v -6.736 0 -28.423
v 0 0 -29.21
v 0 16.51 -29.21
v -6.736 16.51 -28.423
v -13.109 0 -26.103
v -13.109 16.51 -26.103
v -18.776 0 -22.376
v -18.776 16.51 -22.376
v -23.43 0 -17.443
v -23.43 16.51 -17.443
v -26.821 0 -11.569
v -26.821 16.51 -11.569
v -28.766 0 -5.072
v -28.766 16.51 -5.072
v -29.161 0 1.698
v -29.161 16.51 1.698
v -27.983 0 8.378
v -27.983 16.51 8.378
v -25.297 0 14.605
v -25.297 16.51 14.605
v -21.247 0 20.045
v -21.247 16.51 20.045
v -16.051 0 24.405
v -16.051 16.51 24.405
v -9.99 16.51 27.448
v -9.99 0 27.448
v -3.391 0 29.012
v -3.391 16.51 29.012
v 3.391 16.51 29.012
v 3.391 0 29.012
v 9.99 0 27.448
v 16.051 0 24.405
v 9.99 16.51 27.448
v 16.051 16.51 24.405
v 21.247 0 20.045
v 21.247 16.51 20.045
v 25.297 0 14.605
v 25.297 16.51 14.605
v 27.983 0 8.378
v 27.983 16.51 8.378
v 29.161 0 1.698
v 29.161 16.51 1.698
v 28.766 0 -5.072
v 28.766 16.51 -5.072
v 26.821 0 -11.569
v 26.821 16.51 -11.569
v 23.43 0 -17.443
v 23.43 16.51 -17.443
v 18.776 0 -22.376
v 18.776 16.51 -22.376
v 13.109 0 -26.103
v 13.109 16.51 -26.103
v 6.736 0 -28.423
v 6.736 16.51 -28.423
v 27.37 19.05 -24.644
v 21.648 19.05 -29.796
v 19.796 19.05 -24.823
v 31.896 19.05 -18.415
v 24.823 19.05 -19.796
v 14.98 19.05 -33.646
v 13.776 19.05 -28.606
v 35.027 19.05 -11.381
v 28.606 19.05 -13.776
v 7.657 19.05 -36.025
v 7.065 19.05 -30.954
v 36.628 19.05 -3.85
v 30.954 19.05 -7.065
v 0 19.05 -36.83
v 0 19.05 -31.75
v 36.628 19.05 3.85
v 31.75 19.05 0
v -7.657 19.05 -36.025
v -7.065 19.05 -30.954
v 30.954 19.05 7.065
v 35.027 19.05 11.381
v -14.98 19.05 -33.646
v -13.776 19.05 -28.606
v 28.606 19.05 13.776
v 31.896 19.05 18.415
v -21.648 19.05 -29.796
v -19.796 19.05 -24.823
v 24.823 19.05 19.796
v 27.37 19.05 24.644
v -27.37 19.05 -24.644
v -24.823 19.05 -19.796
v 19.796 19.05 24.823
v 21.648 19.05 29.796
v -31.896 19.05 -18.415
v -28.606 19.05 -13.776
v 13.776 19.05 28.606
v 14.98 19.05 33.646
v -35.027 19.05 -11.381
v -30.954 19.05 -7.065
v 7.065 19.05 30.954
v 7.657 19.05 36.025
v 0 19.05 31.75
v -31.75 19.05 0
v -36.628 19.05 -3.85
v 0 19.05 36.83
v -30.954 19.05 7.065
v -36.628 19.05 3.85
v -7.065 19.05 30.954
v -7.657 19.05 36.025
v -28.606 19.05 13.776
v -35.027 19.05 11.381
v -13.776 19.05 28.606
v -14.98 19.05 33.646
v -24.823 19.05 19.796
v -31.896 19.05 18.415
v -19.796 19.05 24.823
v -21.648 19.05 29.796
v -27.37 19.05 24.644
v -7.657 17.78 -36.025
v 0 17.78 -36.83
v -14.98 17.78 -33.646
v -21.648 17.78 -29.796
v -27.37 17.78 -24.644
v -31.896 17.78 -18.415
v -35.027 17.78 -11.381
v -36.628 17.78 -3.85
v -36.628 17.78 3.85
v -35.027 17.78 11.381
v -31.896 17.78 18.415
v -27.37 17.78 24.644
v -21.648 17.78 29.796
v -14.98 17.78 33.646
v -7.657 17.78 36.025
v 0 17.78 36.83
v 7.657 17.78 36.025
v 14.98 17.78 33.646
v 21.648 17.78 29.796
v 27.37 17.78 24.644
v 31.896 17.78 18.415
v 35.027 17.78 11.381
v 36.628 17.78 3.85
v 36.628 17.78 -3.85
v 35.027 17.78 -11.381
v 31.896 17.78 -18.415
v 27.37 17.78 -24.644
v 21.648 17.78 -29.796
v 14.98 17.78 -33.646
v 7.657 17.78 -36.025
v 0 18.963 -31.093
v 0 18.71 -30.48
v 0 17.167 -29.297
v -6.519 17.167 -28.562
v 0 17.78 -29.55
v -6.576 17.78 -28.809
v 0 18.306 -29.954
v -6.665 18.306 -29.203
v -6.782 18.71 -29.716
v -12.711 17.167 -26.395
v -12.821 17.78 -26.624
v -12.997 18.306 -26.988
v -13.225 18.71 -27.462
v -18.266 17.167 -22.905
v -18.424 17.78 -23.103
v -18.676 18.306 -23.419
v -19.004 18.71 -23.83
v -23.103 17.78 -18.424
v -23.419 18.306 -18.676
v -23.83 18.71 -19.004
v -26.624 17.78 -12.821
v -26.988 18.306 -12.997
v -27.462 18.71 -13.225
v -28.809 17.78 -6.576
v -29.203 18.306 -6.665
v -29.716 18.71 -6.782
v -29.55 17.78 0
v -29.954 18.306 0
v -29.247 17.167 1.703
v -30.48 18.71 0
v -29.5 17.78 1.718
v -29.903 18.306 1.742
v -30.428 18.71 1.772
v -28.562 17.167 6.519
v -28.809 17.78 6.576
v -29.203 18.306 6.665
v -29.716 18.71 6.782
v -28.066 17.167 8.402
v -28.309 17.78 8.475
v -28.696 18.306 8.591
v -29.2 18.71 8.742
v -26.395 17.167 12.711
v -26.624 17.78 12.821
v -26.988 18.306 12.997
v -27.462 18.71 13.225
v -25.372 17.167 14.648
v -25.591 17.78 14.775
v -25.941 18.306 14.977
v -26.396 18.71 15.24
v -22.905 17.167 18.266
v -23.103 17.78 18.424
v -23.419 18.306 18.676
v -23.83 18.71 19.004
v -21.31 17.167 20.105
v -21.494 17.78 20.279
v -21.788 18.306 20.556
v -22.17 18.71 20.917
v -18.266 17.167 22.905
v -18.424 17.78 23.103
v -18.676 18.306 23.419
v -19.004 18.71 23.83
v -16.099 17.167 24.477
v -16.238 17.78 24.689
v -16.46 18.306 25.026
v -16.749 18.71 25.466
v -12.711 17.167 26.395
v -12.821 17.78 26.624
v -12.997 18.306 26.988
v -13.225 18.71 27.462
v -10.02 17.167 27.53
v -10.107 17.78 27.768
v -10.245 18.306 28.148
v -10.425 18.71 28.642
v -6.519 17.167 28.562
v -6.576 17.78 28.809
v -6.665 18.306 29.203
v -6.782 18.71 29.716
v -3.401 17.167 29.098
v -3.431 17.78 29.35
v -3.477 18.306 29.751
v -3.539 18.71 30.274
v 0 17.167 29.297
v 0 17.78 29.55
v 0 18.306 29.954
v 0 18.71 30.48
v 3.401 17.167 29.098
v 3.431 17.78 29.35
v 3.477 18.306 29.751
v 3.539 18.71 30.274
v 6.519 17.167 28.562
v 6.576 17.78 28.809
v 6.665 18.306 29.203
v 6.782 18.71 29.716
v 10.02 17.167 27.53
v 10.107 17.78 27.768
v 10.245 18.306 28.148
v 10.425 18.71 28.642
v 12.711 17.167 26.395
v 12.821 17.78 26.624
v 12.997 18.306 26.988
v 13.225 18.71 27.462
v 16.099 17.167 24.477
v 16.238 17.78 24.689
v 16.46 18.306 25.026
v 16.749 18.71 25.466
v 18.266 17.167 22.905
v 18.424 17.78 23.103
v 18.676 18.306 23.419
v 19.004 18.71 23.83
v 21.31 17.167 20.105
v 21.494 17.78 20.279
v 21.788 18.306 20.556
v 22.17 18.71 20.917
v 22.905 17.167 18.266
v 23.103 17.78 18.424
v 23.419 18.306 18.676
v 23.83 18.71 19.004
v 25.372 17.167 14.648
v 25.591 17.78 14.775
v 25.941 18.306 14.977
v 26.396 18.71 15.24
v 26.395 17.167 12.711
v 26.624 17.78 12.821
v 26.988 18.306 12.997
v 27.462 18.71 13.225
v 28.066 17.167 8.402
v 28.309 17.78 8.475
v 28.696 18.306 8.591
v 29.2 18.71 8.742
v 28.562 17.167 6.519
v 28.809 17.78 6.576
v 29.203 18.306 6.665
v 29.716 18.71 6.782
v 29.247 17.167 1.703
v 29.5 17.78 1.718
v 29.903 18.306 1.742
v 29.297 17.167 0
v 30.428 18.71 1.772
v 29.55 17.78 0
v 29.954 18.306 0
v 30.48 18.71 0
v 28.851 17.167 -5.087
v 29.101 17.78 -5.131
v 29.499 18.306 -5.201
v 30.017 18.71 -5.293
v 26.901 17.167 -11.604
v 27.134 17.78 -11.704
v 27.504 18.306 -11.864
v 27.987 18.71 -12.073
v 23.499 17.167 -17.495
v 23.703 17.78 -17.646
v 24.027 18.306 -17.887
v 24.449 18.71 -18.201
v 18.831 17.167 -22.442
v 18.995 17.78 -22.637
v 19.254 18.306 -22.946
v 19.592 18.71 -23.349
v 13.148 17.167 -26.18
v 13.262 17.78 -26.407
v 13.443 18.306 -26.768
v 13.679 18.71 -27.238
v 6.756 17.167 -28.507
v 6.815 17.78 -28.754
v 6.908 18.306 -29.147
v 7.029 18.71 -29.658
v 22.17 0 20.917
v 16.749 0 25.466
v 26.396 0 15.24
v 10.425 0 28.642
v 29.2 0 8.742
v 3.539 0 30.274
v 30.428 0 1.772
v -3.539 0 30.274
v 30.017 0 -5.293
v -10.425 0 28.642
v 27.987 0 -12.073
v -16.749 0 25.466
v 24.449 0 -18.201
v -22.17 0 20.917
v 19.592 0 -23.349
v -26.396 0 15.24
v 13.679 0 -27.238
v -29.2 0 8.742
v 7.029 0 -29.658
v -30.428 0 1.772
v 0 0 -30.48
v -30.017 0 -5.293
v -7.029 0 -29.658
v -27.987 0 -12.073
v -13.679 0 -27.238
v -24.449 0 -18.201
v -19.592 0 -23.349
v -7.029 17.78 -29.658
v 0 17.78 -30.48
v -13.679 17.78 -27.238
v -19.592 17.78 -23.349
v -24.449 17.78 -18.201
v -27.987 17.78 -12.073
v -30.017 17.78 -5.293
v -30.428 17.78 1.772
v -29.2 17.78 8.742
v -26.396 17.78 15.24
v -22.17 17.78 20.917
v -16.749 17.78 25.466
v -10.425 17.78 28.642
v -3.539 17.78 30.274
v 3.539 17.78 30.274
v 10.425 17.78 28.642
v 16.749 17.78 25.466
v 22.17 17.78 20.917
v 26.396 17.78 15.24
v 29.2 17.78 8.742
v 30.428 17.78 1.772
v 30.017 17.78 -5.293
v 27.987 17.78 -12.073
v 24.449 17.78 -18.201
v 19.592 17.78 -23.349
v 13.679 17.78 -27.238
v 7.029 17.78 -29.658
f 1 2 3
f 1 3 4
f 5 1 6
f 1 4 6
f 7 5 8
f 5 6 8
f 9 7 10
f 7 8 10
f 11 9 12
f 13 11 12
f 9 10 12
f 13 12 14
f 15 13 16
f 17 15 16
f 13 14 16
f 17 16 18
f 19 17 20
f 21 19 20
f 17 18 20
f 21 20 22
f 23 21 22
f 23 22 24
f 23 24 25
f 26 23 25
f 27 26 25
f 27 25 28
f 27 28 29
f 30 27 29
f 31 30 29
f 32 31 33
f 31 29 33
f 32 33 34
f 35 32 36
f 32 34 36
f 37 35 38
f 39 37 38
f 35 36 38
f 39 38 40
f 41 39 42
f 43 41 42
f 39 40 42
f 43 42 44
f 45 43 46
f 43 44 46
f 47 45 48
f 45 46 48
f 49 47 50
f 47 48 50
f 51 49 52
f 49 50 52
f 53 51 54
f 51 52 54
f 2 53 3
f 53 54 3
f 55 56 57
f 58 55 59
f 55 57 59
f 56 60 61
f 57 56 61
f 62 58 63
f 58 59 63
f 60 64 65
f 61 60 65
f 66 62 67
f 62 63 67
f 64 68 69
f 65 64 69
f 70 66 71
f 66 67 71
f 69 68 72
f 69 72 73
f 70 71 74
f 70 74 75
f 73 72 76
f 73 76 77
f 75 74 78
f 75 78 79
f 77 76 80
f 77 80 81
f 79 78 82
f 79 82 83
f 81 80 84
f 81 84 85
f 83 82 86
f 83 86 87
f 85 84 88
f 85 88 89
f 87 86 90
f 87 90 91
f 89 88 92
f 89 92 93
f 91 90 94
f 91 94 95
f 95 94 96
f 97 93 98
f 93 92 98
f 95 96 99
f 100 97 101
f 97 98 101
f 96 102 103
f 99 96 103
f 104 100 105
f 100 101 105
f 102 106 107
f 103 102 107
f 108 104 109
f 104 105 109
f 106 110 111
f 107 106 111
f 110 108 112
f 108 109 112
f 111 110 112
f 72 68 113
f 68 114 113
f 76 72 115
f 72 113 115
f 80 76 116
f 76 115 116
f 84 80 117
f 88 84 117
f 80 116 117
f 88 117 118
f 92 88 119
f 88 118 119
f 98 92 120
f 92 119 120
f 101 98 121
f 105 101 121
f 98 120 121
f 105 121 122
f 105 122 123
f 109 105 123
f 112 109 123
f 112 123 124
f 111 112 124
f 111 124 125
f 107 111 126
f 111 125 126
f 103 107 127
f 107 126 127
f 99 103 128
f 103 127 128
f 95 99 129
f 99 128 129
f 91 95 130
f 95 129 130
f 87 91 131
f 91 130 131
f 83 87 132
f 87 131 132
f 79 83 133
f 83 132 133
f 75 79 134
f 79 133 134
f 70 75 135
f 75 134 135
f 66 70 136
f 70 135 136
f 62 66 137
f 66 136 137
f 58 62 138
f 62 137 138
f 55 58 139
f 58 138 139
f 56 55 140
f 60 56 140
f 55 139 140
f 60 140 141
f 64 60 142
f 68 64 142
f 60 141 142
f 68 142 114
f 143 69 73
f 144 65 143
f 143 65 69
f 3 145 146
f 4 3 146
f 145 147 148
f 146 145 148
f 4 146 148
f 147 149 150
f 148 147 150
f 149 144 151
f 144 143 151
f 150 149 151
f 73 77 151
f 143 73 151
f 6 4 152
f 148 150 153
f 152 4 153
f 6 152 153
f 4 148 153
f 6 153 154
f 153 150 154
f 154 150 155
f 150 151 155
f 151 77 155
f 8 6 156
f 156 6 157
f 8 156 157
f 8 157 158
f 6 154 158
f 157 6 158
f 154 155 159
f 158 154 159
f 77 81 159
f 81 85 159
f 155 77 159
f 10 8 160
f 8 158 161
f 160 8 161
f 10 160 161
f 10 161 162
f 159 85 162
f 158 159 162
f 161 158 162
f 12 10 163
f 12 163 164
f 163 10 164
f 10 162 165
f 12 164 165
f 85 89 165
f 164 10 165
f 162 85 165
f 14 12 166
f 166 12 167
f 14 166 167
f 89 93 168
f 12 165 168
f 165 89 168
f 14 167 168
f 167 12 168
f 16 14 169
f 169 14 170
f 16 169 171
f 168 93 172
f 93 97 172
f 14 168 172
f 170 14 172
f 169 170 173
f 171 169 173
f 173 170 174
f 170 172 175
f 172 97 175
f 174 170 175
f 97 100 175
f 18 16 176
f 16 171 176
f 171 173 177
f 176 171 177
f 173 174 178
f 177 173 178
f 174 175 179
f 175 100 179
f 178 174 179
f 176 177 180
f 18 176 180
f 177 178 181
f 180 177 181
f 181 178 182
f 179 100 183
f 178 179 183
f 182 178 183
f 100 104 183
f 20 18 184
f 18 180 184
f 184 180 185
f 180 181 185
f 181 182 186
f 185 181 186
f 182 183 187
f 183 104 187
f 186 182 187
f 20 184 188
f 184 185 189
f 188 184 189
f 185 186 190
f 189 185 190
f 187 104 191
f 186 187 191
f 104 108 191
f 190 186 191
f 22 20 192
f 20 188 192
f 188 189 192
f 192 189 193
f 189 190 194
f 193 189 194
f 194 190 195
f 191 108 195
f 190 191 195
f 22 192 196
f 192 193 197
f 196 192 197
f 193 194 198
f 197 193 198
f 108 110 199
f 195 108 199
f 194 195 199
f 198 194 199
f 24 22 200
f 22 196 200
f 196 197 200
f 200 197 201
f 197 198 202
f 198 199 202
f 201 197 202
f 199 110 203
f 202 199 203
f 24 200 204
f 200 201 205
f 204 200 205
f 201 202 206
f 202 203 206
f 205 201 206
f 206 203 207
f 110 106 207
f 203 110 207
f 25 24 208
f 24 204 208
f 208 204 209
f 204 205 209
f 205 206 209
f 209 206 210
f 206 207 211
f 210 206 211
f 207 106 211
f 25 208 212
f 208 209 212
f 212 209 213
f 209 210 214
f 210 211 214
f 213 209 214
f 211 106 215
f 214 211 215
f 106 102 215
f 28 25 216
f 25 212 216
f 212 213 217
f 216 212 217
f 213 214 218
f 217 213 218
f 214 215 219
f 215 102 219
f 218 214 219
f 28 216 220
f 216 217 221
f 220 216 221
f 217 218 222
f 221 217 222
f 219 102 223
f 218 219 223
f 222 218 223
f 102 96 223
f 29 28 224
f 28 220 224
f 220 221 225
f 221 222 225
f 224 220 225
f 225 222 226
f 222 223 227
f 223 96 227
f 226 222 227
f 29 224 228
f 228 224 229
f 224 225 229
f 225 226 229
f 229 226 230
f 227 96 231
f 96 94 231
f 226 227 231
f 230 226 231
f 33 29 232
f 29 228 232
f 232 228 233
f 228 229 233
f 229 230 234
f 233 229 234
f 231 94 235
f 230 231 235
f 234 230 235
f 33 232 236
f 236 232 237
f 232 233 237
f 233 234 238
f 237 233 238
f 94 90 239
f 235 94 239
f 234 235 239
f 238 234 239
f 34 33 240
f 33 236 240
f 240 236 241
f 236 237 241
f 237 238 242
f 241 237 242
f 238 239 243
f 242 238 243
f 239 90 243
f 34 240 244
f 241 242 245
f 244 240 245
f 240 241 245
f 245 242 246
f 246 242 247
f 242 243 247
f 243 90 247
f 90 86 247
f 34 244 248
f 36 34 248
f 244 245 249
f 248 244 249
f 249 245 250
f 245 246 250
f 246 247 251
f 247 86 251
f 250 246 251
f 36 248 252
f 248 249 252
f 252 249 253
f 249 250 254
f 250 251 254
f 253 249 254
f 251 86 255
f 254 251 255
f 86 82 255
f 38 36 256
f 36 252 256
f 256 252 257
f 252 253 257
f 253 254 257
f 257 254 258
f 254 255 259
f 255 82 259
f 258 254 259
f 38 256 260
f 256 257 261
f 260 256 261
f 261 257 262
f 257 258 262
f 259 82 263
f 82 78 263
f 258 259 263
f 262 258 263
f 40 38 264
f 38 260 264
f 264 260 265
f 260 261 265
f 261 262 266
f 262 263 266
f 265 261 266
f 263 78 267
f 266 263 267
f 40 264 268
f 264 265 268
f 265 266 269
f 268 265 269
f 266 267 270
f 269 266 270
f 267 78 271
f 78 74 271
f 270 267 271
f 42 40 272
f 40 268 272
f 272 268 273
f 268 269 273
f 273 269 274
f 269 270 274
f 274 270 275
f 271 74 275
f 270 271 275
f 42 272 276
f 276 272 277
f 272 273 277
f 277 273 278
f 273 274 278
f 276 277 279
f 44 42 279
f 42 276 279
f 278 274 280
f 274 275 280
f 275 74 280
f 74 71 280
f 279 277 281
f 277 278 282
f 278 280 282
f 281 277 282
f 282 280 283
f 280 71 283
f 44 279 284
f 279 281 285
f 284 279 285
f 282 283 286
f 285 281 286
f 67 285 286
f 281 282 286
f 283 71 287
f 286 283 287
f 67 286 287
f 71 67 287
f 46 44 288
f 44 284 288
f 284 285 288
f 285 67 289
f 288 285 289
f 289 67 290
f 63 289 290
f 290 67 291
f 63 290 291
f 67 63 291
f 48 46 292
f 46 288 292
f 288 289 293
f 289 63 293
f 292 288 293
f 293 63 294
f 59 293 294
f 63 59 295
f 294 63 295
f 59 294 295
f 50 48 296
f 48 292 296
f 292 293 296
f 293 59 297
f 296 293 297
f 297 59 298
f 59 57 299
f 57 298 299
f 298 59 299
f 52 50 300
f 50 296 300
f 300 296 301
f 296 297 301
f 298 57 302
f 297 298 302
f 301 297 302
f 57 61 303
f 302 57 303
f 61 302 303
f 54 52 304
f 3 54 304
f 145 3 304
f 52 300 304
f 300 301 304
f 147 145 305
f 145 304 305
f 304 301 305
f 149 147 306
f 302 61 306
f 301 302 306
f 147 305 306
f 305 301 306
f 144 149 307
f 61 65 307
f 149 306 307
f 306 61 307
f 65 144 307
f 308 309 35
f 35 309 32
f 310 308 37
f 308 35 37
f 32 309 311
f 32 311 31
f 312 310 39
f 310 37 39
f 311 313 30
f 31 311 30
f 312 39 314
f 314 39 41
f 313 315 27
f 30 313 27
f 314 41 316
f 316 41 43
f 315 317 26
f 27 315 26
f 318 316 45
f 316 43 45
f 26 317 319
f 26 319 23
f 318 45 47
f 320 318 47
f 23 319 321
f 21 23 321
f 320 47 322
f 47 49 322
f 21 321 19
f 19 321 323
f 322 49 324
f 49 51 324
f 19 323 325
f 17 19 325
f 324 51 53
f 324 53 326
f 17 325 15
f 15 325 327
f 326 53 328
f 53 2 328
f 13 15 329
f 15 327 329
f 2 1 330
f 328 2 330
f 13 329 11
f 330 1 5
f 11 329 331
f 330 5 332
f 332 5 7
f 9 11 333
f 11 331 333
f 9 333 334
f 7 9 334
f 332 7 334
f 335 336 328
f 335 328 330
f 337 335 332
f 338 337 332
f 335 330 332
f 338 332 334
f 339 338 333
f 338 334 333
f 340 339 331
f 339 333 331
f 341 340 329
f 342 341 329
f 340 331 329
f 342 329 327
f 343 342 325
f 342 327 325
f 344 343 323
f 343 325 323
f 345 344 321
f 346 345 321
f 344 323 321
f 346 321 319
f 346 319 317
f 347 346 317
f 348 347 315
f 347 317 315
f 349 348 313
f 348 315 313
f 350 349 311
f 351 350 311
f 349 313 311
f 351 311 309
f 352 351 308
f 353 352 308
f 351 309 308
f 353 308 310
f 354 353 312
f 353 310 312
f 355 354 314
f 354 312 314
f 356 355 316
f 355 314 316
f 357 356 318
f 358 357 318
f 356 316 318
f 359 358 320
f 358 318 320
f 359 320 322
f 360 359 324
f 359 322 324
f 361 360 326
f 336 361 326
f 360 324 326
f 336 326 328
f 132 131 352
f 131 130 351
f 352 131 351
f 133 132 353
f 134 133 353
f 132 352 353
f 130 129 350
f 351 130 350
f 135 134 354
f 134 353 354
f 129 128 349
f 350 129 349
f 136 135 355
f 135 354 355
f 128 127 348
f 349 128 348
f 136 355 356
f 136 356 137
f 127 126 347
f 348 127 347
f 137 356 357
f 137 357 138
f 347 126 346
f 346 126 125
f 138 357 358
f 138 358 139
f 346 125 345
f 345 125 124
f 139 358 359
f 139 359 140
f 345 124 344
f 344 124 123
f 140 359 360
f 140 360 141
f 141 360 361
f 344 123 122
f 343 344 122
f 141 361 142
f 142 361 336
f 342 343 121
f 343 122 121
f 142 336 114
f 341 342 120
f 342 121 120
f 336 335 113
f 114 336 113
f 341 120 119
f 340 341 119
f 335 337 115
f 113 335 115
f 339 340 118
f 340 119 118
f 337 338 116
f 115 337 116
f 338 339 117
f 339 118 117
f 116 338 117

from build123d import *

# Parameters (mm, degrees)
FILLET1_R = 2.54


with BuildPart() as part:
    # Sketch1 → Revolve1 (revolve)
    with BuildSketch(Plane.XY, mode=Mode.PRIVATE) as revolve1_sk:
        Polygon((29.21, 0), (29.21, 19.05), (36.83, 19.05), (36.83, 17.78), (30.48, 17.78), (30.48, 0), align=None)
    revolve(revolve1_sk.sketch.rotate(Axis((0, 0, 0), (0, 1, 0)), 90), axis=Axis((0, 0, 0), (0, 1, 0)))

    # Fillet1
    fillet1_edges = [part.edges().sort_by_distance(p)[0] for p in [
        (0, 19.05, 29.21),
    ]]
    fillet(fillet1_edges, radius=FILLET1_R)


solid = part.part
